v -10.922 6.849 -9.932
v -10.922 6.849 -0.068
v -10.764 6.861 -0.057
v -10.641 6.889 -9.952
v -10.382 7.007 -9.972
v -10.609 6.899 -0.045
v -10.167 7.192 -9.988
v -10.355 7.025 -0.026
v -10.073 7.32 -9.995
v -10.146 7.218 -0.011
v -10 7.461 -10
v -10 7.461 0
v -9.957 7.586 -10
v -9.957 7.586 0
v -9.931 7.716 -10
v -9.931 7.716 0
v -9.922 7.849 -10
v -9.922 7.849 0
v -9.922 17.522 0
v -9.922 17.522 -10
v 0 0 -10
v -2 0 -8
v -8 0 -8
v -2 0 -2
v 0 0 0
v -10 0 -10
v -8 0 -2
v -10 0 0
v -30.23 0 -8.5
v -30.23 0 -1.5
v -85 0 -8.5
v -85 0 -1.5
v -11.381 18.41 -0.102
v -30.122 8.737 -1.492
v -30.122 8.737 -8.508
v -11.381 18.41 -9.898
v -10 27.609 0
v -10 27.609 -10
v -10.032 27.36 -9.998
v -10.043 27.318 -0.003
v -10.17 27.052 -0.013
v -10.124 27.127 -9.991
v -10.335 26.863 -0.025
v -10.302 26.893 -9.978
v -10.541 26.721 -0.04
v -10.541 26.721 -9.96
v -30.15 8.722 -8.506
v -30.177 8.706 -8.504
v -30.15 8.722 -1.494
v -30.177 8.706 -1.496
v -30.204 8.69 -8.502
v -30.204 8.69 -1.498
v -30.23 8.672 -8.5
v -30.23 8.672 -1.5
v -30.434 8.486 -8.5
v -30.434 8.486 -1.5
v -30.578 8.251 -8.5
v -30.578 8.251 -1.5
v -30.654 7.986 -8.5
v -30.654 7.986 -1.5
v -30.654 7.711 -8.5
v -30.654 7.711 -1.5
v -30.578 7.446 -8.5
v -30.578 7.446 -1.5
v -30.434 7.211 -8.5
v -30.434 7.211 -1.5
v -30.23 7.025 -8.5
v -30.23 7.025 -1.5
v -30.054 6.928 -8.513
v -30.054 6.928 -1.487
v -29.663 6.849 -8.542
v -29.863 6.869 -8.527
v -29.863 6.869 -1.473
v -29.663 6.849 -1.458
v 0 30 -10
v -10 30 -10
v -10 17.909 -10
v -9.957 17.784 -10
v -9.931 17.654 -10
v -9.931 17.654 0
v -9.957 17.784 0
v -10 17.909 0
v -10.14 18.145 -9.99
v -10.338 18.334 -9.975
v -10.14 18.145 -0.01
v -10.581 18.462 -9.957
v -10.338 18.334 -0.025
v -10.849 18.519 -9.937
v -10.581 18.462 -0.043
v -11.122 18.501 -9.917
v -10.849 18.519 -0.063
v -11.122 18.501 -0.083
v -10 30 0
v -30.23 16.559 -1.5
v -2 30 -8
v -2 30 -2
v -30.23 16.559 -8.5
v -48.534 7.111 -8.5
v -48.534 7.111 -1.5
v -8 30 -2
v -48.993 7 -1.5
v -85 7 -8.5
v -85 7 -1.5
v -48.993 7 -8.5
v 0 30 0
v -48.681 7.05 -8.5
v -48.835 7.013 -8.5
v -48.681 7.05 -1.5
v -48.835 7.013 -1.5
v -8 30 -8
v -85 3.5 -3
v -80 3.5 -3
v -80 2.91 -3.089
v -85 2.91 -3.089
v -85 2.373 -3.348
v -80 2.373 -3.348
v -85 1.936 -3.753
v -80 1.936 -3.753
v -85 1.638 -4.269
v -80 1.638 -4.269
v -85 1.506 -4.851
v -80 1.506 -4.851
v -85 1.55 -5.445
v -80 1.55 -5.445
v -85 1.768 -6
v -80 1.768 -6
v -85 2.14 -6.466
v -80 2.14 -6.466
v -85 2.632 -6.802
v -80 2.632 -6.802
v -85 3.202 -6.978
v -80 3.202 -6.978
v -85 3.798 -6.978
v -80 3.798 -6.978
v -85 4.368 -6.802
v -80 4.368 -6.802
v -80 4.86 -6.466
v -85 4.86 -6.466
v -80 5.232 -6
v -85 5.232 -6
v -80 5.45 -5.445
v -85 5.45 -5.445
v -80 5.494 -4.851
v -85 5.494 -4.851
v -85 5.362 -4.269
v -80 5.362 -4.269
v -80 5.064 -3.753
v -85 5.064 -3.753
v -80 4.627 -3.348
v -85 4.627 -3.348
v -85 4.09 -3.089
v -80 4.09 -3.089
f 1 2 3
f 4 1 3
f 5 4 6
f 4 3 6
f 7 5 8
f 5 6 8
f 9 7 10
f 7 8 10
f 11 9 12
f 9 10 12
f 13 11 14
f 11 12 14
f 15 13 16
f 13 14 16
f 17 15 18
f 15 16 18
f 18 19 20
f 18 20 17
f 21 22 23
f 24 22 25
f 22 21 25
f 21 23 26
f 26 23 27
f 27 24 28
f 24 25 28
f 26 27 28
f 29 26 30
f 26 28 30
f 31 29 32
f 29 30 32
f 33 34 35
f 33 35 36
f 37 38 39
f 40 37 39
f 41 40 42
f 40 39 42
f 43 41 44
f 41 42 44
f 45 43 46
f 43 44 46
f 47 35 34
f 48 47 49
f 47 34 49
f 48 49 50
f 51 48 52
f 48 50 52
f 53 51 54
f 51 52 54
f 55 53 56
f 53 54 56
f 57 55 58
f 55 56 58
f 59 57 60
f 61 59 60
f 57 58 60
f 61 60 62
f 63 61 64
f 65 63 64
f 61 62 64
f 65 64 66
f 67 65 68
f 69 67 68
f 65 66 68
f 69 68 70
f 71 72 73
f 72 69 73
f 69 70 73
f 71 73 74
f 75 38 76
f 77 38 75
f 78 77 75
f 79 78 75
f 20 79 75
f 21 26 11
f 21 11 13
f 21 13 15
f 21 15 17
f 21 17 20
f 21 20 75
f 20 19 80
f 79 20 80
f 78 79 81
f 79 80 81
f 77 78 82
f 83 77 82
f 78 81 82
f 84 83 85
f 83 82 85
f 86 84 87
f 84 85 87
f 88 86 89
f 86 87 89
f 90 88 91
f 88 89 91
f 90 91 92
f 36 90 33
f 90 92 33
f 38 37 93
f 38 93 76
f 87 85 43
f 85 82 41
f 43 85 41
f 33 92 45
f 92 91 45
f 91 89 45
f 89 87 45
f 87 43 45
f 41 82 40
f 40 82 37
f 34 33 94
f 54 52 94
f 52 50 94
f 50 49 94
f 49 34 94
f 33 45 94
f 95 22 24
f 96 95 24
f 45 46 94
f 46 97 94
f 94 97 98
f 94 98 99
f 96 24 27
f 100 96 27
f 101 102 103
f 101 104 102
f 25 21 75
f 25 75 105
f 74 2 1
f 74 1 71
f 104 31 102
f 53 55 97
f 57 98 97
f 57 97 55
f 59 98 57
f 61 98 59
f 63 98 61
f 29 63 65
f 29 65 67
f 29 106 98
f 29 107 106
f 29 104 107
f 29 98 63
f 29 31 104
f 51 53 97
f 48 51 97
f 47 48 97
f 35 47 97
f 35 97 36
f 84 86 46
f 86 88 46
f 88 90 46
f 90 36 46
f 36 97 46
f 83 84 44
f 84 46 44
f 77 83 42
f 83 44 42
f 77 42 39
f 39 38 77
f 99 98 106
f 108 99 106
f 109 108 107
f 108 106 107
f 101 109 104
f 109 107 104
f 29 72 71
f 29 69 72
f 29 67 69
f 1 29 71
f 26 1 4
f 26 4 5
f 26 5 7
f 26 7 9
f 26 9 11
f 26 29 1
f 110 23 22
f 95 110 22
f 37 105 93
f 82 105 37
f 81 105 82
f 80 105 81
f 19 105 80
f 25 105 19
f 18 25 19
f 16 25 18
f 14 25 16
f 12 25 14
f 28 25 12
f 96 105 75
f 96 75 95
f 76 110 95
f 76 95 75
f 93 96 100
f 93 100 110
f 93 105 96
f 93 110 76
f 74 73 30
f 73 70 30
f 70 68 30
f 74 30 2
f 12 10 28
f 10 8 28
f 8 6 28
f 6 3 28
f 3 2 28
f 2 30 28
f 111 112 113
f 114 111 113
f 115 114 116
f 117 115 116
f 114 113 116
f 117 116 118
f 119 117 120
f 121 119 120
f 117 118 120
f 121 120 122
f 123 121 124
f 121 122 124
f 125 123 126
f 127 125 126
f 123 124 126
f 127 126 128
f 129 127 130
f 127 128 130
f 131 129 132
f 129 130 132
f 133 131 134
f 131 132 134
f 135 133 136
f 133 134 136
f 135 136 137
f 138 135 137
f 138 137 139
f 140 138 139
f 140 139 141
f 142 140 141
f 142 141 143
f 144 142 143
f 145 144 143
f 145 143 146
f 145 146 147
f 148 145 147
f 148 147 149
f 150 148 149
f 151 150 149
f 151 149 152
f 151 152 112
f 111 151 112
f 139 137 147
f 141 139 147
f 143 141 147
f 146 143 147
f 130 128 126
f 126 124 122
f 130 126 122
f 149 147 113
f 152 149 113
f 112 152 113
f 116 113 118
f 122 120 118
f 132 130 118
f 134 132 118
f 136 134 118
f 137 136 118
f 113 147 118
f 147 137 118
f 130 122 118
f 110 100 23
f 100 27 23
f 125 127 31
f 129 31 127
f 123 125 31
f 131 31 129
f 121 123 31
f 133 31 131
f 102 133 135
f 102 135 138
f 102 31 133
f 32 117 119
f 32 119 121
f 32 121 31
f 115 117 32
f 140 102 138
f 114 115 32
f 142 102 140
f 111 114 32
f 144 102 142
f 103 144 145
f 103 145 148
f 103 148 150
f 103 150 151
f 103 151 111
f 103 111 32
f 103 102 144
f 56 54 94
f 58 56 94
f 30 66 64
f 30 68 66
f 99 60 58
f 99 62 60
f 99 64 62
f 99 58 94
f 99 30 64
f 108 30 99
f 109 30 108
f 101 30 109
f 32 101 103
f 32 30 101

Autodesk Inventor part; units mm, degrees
ref_plane "YZ Plane" through (0, 0, 0) normal (1, 0, 0) x (0, 1, 0)
ref_plane "XZ Plane" through (0, 0, 0) normal (0, 1, 0) x (-1, 0, 0)
ref_plane "XY Plane" through (0, 0, 0) normal (0, 0, 1) x (1, 0, 0)
sketch "Sketch1" plane through (0, 0, 0) normal (0, 1, 0) x (-1, 0, 0)
  line L0 (0, 0) -> (10, 0)
  line L1 (10, 0) -> (10, -10)
  line L2 (10, -10) -> (0, -10)
  line L3 (0, -10) -> (0, 0)
  line L4 (10, 0) -> (0, -10) construction
  line L5 (10, -10) -> (0, 0) construction
  line L6 (2, -2) -> (8, -2)
  line L7 (8, -2) -> (8, -8)
  line L8 (8, -8) -> (2, -8)
  line L9 (2, -8) -> (2, -2)
  line L10 (2, -2) -> (8, -8) construction
  line L11 (8, -2) -> (2, -8) construction
  point P0 (5, -5)
  dimension "d0" = 10
  dimension "d4" = 6
  dimension "d5" = 6
extrude "Extrusion1" add sketch "Sketch1" along normal blind 30
sketch "Sketch2" plane through (-10, 0, -10) normal (-1, 0, 0) x (0, 0, 1)
  line L0 (0, 30) -> (10, 30) construction
  line L1 (10, 0) -> (0, 0) projected
  line L2 (10, 0) -> (0, 0) construction
  line L3 (0, 0) -> (0, 7)
  line L4 (0, 7) -> (10, 7)
  line L5 (10, 7) -> (10, 0)
  line L6 (0, 0) -> (0, 30) construction
  line L7 (10, 0) -> (10, 30) construction
  dimension "d8" = 7
  dimension "d9" = 10
extrude "Extrusion2" add sketch "Sketch2" along normal blind 75
chamfer "Chamfer1" distance 20 distance2 38.75 1 edges at (-10, 7, -5) measured on face at (-10, 14.6667, -6.6667)
sketch "Sketch3" plane through (0, 0, 0) normal (0, 0, 1) x (1, 0, 0)
  line L0 (-48.75, 7) -> (-85, 7) construction
  line L1 (-10, 27) -> (-10, 30) construction
  line L2 (-9.9219, 6.8486) -> (-33.7809, 6.8486)
  line L3 (-33.7809, 6.8486) -> (-9.9219, 19.163)
  line L4 (-9.9219, 19.163) -> (-9.9219, 6.8486)
  line L5 (-48.75, 7) -> (-10, 27) projected
  point P0 (0, 0)
  dimension "d21" = 7
extrude "Extrusion3" cut sketch "Sketch3" against normal through all
sketch "Sketch6" plane through (0, 0, 0) normal (0, -1, 0) x (1, 0, 0)
  line L0 (-85, -10) -> (-85, 0) construction
  line L1 (-85, -5) -> (0, -5) construction
  line L2 (0, 0) -> (0, -10) construction
  line L3 (-30.2304, -1.5) -> (-85, -1.5)
  line L4 (-85, -1.5) -> (-85, -8.5)
  line L5 (-85, -8.5) -> (-30.2304, -8.5)
  line L6 (-30.2304, -8.5) -> (-30.2304, -1.5) construction
  line L7 (-30.2304, -1.5) -> (-85, -8.5) construction
  line L8 (-85, -1.5) -> (-30.2304, -8.5) construction
  line L9 (-30.2304, -8.5) -> (0, -8.5) construction
  line L10 (-30.2304, -1.5) -> (0, -1.5) construction
  line L11 (-30.2304, -8.5) -> (-10, -10)
  line L12 (0, -10) -> (-10, -10) construction
  line L13 (-30.2304, -1.5) -> (-10, 0)
  line L14 (-10, 0) -> (0, 0) construction
  line L15 (-10, -10) -> (-10, -18.6026)
  line L16 (-10, -18.6026) -> (-95.3433, -18.6026)
  line L17 (-95.3433, -18.6026) -> (-95.3433, 10.4)
  line L18 (-95.3433, 10.4) -> (-10, 10.4)
  line L19 (-10, 10.4) -> (-10, 0)
  point P0 (-57.6152, -5)
  dimension "d22" = 7
extrude "Extrusion5" cut sketch "Sketch6" against normal through all
hole "Hole1" at (-85, 3.5, -5) direction (1, 0, 0) diameter 4 depth 5
fillet "Fillet1" radius 1 5 edges at (-33.7809, 6.8486, -5) (-9.9219, 6.8486, -5) (-9.9219, 19.163, -5) (-48.75, 7, -5) (-10, 27, -5)
properties part number "foot_1_2"
